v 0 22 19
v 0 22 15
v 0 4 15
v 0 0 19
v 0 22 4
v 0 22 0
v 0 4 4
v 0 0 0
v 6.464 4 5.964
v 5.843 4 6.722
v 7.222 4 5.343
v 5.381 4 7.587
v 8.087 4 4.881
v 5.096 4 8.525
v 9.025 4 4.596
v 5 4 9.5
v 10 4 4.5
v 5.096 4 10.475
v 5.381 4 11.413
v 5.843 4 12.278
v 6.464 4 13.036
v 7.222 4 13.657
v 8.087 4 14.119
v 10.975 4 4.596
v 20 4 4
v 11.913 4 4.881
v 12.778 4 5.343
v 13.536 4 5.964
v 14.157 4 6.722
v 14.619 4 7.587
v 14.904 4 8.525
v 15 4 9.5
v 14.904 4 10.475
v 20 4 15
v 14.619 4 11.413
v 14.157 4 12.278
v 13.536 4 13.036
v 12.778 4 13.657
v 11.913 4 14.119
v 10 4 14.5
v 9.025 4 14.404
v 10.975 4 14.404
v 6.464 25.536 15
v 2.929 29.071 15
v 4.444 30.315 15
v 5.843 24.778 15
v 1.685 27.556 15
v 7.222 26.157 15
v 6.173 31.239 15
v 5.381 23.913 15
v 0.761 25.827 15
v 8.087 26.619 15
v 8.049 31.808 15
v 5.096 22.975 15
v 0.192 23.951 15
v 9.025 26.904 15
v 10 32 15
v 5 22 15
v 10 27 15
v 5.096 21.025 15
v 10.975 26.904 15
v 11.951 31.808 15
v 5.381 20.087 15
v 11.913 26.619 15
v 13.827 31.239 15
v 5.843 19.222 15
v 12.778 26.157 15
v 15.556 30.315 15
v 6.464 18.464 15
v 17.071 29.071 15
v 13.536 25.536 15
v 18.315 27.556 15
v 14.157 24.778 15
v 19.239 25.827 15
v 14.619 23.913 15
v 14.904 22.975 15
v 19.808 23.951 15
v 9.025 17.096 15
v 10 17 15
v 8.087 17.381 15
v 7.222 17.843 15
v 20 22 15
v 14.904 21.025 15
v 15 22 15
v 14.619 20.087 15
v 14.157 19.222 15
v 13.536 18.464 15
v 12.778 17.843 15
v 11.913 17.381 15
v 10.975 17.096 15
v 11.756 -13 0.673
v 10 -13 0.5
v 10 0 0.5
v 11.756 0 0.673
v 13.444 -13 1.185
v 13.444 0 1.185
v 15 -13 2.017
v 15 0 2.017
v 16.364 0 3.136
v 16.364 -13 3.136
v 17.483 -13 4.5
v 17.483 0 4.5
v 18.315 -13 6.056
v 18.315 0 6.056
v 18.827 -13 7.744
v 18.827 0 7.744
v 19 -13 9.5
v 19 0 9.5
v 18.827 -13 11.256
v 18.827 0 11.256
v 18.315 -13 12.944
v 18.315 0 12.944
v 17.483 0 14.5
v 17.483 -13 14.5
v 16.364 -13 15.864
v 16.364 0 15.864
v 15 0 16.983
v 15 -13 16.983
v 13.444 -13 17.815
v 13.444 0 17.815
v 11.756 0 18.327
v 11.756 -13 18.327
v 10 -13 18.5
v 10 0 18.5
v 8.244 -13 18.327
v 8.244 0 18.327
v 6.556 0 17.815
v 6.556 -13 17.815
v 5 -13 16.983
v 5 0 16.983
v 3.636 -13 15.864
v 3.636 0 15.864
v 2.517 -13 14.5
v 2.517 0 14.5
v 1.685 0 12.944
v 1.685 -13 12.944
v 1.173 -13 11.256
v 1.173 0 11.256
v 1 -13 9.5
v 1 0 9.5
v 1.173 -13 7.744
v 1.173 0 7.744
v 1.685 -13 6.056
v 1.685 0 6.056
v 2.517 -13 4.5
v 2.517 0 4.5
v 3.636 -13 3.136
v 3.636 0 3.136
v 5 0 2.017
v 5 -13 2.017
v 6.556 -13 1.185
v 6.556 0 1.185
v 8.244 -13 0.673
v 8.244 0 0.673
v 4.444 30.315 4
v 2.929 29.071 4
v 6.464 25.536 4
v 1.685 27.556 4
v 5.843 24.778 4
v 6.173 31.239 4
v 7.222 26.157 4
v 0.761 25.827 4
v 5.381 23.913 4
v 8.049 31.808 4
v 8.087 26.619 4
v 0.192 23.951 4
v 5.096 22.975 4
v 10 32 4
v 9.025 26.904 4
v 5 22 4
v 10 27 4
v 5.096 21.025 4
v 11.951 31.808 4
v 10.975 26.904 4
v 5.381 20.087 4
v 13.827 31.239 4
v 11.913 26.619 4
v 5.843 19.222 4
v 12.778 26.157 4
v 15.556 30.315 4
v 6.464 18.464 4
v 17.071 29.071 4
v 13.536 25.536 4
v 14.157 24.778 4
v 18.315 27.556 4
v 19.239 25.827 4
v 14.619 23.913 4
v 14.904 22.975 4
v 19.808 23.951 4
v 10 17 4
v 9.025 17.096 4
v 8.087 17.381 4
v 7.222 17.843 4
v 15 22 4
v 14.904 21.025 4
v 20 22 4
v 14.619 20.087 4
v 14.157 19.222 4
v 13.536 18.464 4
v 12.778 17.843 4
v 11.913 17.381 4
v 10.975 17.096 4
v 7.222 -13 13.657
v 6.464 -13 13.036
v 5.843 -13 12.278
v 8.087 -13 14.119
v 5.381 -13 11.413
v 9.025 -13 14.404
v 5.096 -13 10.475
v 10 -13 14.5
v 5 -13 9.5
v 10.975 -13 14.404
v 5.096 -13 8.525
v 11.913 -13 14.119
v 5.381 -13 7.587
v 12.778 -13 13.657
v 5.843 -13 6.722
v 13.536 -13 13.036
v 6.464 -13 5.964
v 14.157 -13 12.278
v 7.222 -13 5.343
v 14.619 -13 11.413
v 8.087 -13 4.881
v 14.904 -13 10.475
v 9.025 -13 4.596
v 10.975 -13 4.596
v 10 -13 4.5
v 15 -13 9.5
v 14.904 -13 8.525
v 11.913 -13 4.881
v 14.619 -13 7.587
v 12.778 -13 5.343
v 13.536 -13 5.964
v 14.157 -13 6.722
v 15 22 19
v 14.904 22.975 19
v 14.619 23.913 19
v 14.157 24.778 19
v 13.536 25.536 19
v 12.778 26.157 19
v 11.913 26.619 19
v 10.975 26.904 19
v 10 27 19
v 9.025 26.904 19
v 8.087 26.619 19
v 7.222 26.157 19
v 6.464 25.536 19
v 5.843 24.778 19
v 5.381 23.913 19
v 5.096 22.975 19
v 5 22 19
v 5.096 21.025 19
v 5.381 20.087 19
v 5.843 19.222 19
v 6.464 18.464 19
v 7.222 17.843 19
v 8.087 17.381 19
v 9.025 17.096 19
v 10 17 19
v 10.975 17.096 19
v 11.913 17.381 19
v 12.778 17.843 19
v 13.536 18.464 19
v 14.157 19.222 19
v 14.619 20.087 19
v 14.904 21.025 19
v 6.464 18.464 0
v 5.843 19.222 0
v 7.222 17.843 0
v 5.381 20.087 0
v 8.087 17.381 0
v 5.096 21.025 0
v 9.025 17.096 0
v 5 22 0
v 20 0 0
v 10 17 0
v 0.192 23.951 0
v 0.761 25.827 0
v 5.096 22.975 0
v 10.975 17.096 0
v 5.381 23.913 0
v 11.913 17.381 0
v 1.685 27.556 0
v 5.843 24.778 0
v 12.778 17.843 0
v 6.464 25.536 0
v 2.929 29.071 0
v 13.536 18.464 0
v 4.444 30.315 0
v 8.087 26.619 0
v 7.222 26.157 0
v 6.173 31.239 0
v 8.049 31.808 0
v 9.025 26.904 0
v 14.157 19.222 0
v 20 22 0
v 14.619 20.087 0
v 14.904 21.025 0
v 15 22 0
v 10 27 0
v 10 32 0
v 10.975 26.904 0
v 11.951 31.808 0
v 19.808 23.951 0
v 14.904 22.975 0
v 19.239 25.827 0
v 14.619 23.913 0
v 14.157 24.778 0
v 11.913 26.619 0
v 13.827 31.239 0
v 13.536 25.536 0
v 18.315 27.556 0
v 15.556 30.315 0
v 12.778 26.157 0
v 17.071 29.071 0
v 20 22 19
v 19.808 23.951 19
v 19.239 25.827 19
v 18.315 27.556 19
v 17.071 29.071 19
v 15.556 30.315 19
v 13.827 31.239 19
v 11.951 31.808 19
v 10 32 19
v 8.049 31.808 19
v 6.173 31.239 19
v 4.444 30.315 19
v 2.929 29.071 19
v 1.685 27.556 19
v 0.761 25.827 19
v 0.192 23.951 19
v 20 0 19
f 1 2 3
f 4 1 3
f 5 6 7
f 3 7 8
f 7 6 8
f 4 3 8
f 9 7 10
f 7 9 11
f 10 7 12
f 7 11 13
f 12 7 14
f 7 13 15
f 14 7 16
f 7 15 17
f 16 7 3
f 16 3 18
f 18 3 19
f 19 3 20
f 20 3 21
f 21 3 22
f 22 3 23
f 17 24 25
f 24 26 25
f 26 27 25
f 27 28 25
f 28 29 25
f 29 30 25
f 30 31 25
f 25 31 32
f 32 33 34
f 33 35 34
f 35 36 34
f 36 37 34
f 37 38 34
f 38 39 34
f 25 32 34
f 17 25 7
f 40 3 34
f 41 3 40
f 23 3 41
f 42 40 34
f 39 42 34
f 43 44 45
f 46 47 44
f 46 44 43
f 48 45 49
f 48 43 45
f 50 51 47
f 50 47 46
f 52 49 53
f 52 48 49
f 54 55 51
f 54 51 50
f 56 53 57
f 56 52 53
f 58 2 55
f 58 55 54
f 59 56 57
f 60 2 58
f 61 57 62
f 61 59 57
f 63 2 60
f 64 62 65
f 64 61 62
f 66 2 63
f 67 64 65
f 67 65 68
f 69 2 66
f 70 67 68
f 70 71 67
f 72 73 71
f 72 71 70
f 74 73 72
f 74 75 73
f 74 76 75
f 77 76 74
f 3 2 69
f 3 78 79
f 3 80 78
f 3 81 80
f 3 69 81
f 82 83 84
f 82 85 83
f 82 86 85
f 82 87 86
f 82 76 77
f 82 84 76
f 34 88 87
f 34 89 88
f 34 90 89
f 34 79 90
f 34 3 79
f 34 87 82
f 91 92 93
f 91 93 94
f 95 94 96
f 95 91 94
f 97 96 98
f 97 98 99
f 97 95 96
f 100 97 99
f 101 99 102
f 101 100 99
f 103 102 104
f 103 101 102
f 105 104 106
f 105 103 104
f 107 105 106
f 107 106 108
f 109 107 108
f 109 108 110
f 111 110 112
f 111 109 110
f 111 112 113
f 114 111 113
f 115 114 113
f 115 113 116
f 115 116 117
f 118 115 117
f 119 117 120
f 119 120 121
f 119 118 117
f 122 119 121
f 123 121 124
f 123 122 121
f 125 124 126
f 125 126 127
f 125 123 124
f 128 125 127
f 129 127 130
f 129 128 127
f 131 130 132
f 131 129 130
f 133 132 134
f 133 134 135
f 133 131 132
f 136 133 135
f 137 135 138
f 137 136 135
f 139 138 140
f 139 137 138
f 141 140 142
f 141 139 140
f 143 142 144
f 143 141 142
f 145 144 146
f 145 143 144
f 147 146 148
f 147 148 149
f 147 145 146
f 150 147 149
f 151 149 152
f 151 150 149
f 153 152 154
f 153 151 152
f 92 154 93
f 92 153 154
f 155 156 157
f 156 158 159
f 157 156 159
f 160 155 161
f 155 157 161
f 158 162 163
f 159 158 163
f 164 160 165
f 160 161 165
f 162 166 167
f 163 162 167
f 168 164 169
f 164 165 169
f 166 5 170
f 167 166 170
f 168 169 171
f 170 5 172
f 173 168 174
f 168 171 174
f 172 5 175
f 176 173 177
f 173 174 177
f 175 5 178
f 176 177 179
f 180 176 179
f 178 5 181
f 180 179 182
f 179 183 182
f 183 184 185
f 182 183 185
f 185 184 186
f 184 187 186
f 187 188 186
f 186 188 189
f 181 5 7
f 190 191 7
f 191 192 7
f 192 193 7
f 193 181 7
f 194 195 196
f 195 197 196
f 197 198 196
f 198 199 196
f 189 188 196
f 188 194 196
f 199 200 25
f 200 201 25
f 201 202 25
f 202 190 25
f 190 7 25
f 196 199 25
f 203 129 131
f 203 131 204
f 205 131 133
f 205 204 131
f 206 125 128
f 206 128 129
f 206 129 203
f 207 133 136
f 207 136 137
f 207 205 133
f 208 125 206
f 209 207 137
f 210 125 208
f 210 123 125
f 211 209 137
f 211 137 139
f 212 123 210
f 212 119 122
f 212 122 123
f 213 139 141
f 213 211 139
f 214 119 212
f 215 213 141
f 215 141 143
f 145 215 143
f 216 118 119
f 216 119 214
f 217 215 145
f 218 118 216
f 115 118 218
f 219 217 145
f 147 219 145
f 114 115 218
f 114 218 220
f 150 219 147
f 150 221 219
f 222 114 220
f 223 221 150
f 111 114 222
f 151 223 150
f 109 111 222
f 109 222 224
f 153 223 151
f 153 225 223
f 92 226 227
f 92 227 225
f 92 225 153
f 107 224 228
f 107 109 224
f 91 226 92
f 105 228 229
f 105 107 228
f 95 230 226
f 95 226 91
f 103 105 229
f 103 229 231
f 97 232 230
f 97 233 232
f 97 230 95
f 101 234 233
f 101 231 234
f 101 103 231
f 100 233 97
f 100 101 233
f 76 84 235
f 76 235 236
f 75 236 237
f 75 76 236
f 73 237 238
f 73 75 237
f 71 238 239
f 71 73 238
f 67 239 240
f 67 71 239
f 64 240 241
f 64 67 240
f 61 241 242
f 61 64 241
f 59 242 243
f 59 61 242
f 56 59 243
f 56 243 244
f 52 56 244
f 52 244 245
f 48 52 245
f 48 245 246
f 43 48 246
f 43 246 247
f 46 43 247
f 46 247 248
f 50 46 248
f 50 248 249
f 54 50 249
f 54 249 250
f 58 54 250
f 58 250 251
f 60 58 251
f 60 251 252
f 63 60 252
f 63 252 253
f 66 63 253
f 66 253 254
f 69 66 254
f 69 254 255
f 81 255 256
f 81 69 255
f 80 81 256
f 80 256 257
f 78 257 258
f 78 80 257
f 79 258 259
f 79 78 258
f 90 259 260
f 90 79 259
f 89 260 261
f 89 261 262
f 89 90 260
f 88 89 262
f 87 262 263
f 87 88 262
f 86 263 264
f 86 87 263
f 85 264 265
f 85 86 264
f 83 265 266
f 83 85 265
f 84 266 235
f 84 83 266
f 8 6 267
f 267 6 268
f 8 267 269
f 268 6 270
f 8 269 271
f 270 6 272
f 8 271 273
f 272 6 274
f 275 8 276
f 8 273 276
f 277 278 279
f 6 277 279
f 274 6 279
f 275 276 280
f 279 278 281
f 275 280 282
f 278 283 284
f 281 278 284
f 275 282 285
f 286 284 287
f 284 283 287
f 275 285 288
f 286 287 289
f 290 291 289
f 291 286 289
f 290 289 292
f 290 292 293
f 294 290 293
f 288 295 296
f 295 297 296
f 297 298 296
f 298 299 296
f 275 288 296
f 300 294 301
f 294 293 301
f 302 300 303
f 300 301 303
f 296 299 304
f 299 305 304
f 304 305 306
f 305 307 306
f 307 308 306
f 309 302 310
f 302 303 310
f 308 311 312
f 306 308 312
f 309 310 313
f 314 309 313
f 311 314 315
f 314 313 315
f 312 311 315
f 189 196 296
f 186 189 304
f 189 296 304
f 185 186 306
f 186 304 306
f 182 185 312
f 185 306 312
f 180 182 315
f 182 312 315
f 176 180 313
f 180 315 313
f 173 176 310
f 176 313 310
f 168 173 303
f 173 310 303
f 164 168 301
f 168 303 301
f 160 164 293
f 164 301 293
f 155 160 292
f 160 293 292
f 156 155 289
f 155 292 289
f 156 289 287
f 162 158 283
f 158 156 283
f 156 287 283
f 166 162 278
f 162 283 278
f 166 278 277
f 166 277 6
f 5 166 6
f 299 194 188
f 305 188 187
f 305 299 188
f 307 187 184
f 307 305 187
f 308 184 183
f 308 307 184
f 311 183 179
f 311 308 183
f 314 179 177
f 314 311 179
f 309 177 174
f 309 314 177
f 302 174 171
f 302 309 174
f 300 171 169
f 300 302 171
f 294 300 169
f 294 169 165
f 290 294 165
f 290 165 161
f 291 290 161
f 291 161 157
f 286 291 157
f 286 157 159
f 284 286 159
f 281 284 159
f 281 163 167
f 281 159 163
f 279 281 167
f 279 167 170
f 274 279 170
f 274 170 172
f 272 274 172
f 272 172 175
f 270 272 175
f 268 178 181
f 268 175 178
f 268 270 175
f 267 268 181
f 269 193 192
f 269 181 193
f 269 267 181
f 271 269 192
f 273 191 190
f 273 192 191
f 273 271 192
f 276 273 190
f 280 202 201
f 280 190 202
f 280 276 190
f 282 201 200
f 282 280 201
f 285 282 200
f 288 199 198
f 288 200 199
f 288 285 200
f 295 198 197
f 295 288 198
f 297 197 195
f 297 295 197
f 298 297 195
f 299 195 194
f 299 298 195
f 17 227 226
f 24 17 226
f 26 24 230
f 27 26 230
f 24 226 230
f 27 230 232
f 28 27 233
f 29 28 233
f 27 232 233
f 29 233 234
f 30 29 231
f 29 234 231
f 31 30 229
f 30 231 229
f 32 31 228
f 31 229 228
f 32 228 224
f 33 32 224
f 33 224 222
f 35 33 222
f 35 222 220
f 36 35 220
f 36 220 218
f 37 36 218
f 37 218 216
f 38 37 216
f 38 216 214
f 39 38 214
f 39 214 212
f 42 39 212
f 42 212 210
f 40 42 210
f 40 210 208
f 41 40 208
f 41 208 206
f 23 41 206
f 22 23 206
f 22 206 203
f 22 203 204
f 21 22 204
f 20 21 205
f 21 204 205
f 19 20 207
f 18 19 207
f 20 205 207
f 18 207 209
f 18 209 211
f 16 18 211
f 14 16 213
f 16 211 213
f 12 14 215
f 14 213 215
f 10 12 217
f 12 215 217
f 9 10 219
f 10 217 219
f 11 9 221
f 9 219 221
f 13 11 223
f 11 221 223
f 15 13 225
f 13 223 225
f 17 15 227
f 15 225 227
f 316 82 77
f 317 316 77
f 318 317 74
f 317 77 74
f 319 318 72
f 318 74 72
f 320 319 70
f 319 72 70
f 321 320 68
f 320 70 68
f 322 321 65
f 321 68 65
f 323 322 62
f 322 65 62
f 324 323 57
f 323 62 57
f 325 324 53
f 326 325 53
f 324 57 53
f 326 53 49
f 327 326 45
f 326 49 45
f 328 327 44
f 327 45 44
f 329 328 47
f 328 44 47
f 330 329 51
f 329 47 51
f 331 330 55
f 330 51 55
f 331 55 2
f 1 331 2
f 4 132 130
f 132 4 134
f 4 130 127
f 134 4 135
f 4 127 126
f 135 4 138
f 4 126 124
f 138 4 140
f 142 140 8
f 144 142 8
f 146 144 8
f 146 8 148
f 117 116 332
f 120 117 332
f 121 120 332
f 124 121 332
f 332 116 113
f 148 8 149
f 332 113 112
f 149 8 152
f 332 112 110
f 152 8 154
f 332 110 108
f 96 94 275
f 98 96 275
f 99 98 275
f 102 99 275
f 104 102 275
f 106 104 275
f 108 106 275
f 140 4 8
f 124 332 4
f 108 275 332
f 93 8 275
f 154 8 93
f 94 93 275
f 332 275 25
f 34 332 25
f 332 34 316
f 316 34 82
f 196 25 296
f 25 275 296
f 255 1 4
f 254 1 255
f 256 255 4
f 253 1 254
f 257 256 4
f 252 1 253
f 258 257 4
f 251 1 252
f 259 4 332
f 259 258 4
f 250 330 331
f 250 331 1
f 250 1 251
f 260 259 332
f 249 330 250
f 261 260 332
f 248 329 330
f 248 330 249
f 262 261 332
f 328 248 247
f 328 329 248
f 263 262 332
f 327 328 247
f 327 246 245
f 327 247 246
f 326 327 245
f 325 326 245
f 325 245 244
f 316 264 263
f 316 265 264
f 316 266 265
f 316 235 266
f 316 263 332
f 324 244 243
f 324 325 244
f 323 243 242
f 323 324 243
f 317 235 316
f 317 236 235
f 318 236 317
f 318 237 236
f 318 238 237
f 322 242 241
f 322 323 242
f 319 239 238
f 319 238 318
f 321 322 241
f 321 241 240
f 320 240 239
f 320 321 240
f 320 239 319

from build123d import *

# Parameters (mm, degrees)
ESQUISSE1_R             = 10
ESQUISSE1_R_2           = 5
BOSS_EXTRU_1_DEPTH      = 19
ENL_V_START             = -4
ESQUISSE2_W             = 20
ESQUISSE2_H             = 11
ENL_V_MAT_EXTRU_1_DEPTH = 39.249260349
ESQUISSE3_R             = 5
ENL_V_MAT_EXTRU_2_DEPTH = 43.249260349
BOSS_EXTRU_2_START      = 13
ESQUISSE4_R             = 9
ESQUISSE4_R_2           = 5
BOSS_EXTRU_2_DEPTH      = 13


with BuildPart() as part:
    # Esquisse1 → Boss.-Extru.1 (new body)
    # profile 1 of 2: a face of its own
    with BuildSketch(Plane.XY):
        with BuildLine():
            Line((0, 22), (0, 0))
            Line((0, 0), (20, 0))
            Line((20, 0), (20, 22))
            ThreePointArc((20, 22), (10, 12), (0, 22))
        make_face()
    # profile 2 of 2: a face of its own
    with BuildSketch(Plane.XY):
        with Locations((10, 22)):
            Circle(ESQUISSE1_R)
        with Locations((10, 22)):
            Circle(ESQUISSE1_R_2, mode=Mode.SUBTRACT)
    extrude(amount=BOSS_EXTRU_1_DEPTH)

    # Esquisse2 → Enlèv. mat.-Extru.1 (cut, through all)
    with BuildSketch(Plane.XZ.offset(ENL_V_START)):
        with Locations((10, 9.5)):
            Rectangle(ESQUISSE2_W, ESQUISSE2_H)
    extrude(amount=-ENL_V_MAT_EXTRU_1_DEPTH, mode=Mode.SUBTRACT)

    # Esquisse3 → Enlèv. mat.-Extru.2 (cut, through all)
    with BuildSketch(Plane.XZ):
        with Locations(Location((10, 9.5, 0), (0, 0, 270))):
            Circle(ESQUISSE3_R)
    extrude(amount=-ENL_V_MAT_EXTRU_2_DEPTH, mode=Mode.SUBTRACT)

    # Esquisse4 → Boss.-Extru.2 (add)
    with BuildSketch(Plane.XZ.offset(BOSS_EXTRU_2_START)):
        with Locations(Location((10, 9.5, 0), (0, 0, 270))):
            Circle(ESQUISSE4_R)
        with Locations(Location((10, 9.5, 0), (0, 0, 270))):
            Circle(ESQUISSE4_R_2, mode=Mode.SUBTRACT)
    extrude(amount=-BOSS_EXTRU_2_DEPTH)


solid = part.part
